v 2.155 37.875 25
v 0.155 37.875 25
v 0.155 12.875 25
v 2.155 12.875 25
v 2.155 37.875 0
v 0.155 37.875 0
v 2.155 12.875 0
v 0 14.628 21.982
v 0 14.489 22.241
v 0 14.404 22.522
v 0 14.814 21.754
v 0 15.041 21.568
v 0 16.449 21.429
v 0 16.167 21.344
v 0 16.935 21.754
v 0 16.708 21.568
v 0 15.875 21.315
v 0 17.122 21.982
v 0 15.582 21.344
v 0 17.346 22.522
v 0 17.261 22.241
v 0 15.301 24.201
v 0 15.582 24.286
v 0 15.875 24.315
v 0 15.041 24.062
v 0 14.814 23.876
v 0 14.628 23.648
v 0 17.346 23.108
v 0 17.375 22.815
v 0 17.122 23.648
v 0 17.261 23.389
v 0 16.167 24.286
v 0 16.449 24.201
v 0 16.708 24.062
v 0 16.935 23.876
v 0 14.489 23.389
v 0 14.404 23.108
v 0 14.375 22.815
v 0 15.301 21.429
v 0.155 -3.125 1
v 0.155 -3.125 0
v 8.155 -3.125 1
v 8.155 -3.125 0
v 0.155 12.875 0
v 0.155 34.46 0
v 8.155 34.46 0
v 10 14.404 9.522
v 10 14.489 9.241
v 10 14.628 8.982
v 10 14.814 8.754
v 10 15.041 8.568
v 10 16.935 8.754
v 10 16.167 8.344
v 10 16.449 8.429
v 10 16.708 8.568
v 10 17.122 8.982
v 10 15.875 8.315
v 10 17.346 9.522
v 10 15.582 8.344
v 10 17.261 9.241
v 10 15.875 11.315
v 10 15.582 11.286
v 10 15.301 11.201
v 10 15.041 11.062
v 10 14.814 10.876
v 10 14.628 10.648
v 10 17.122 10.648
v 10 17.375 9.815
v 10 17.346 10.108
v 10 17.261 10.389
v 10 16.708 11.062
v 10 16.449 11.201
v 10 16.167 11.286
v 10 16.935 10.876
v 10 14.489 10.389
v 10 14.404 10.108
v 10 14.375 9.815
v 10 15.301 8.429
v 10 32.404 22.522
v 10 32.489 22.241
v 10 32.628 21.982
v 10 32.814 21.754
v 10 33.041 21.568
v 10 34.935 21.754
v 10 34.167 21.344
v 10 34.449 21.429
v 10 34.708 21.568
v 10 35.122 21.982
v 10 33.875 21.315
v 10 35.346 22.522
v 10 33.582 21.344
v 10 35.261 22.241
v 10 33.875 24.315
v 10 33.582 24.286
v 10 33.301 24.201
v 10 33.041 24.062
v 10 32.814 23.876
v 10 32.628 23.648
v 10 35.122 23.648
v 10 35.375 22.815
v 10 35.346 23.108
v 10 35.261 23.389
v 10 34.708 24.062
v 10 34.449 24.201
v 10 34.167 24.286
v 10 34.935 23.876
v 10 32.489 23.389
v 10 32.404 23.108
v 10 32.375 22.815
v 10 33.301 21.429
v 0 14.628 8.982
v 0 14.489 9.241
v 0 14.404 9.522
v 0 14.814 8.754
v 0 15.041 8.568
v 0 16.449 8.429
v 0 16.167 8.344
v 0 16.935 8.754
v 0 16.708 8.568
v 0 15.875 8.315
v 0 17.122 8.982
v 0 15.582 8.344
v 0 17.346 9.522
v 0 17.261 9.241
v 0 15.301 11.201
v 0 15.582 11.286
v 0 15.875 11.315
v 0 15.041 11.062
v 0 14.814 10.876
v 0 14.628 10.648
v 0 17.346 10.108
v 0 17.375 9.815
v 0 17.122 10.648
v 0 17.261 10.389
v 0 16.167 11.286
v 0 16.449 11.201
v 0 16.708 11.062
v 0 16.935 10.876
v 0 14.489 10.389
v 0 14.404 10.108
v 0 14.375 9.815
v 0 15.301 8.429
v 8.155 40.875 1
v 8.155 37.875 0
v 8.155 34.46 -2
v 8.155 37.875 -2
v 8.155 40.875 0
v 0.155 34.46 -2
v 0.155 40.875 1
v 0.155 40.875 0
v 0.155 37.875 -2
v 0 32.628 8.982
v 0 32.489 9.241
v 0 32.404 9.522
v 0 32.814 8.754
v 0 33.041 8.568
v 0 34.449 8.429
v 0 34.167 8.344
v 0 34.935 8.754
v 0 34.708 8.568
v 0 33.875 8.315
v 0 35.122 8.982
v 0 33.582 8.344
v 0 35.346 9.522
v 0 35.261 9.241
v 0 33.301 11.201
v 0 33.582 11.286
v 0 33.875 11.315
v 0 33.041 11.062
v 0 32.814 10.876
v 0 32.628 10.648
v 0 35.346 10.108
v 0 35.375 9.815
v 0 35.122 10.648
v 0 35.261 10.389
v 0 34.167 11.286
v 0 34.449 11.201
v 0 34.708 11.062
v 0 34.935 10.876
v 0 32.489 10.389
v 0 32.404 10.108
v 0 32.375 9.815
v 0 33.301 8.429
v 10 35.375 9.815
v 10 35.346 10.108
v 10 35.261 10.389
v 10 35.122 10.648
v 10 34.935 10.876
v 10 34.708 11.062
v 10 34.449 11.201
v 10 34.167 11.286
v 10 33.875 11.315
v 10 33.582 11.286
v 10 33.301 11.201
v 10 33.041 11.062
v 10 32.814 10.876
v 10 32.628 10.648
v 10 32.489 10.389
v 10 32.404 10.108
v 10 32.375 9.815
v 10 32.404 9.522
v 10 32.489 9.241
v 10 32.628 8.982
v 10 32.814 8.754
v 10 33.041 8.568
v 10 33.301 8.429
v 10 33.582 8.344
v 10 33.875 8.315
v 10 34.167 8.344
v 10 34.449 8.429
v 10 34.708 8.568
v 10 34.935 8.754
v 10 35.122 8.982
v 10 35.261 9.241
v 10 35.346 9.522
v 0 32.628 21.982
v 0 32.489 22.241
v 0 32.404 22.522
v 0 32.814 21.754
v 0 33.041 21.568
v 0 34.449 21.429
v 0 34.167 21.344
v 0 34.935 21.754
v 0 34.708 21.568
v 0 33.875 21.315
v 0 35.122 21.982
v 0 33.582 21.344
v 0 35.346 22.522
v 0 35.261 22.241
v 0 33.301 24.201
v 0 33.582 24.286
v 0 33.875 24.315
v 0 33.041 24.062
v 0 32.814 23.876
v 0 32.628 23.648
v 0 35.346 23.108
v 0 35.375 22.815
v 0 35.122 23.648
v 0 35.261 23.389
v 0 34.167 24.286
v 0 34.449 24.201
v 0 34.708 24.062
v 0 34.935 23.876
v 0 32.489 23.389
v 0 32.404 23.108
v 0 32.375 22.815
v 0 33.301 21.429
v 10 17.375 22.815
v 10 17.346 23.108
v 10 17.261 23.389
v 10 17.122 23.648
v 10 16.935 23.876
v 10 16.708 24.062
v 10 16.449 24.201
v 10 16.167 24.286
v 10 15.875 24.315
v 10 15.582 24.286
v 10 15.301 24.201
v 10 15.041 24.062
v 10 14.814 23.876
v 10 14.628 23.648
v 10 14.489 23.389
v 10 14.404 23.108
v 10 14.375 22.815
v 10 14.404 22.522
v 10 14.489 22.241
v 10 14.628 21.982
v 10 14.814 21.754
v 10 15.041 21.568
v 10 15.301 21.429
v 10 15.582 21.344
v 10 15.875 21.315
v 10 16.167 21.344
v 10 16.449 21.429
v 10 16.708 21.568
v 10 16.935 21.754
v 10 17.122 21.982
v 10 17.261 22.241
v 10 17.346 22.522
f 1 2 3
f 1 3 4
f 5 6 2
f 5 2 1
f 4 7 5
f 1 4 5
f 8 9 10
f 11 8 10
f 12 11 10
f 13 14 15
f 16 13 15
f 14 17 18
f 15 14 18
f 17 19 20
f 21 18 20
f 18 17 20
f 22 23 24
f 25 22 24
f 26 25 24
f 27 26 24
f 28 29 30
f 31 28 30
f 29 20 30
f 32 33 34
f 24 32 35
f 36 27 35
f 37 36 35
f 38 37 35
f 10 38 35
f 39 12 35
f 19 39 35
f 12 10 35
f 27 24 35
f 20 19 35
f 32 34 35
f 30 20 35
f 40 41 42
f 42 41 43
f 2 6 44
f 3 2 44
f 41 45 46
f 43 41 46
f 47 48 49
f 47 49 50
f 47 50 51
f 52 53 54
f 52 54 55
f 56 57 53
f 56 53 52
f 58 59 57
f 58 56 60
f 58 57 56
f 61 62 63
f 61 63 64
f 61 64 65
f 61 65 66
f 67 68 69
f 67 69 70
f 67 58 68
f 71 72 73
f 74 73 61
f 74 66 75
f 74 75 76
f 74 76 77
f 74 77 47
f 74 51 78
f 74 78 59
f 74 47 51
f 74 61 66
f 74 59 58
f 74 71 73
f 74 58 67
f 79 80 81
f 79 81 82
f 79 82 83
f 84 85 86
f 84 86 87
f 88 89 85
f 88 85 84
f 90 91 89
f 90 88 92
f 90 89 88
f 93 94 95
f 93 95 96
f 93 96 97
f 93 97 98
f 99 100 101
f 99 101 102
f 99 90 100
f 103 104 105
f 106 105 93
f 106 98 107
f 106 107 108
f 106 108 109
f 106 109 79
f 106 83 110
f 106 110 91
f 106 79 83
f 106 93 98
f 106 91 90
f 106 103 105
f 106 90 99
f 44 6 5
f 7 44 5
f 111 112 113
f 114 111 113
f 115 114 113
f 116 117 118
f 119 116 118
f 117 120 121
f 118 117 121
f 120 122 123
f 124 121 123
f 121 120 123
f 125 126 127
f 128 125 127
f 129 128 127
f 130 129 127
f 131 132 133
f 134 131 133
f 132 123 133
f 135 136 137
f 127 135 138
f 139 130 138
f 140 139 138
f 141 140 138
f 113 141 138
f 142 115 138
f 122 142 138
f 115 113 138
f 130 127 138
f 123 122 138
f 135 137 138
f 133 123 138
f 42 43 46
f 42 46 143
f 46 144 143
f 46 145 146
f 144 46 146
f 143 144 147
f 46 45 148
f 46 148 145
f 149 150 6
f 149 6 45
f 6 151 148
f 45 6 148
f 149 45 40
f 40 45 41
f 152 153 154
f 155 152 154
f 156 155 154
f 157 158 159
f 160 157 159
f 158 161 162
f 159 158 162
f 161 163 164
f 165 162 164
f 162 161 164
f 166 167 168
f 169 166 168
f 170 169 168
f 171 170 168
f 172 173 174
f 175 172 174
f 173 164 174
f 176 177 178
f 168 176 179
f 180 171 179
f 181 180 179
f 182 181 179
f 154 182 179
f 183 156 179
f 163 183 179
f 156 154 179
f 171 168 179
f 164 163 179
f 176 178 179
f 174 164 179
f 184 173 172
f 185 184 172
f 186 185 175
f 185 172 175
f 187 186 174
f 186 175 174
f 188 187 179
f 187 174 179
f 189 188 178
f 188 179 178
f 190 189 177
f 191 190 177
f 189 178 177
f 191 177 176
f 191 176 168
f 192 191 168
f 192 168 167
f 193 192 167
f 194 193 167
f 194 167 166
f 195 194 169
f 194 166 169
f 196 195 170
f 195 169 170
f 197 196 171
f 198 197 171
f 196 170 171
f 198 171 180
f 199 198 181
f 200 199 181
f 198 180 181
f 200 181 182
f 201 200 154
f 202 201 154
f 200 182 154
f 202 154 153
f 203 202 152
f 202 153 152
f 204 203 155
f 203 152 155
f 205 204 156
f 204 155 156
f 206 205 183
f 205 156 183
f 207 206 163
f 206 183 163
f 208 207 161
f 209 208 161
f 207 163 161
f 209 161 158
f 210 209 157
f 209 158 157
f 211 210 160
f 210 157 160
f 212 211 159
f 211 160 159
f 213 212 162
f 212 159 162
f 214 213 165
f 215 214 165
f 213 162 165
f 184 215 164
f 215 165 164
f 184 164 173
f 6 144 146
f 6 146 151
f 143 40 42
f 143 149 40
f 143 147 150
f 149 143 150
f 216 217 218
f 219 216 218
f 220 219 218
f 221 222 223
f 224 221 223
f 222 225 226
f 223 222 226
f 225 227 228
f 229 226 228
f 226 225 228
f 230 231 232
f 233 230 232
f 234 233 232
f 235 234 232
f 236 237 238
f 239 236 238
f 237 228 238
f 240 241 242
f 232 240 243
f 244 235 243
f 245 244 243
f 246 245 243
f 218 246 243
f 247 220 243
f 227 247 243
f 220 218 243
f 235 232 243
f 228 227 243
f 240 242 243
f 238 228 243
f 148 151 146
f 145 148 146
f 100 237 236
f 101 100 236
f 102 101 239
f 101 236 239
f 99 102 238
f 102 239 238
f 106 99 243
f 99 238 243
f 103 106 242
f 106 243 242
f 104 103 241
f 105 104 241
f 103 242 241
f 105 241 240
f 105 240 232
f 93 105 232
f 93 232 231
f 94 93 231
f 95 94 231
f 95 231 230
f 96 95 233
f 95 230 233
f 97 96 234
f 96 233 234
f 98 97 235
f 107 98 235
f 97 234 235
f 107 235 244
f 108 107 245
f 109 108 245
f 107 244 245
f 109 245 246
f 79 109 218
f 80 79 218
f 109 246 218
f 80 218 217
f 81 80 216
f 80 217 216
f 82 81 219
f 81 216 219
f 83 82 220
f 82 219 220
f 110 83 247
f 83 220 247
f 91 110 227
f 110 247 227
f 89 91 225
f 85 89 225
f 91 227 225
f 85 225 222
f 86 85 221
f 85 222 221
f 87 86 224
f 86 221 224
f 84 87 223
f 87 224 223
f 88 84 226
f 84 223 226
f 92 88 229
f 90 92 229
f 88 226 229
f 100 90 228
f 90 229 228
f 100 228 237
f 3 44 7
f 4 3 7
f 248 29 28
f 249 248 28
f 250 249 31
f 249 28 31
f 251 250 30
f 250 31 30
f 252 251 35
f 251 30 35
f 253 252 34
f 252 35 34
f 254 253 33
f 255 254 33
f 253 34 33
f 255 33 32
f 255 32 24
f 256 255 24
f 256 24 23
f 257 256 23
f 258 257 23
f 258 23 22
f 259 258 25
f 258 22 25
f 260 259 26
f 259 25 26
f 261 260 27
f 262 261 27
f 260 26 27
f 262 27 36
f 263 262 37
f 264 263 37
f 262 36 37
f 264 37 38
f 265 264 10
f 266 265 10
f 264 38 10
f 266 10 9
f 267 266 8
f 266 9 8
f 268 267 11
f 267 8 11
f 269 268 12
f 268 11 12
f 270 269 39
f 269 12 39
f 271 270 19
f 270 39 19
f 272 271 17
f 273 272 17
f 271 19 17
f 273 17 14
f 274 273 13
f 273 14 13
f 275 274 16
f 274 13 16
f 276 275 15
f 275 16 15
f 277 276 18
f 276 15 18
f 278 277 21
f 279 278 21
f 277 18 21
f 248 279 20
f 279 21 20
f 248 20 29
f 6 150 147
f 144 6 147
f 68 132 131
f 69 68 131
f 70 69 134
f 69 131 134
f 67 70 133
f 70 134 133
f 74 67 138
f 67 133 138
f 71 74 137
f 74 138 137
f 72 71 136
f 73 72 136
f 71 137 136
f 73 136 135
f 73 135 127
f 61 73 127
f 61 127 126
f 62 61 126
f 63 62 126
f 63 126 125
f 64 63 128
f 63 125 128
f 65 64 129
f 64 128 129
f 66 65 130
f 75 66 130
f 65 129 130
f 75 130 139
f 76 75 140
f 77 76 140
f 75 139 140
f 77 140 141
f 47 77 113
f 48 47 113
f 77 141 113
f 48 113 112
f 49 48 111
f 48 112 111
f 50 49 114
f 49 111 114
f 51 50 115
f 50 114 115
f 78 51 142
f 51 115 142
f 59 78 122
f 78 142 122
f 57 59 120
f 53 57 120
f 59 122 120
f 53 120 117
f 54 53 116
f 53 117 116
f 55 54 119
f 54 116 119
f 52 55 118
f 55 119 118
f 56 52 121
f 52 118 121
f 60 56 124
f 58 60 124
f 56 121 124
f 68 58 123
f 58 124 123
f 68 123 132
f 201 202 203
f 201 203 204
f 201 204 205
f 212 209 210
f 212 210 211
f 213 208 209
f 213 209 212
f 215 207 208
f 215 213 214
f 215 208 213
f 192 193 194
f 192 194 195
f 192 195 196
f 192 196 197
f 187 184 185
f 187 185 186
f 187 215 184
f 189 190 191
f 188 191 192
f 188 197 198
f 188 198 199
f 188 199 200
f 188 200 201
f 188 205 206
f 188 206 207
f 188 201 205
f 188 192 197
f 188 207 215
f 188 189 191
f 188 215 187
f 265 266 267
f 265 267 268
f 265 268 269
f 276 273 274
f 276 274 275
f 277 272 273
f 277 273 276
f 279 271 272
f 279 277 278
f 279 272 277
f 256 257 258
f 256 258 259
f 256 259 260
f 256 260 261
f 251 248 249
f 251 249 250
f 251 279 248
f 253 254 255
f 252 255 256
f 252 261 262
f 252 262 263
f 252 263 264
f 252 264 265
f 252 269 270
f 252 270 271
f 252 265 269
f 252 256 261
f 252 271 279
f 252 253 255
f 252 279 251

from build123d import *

# Parameters (mm, degrees)
F0_W     = 6
F0_H     = 3.4142509103
F0_W_2   = 2
F1_DEPTH = 2
F0_H_2   = 21.5857490897
F2_DEPTH = 1
F3_DEPTH = 25
F4_R     = 1.5
F5_DEPTH = 10


with BuildPart() as f1:
    # F0 (on Top) → F1 (new body)
    with BuildSketch(Plane.XY):
        with Locations((5.1546765715, 36.1676104367)):
            Rectangle(F0_W, F0_H)
        with Locations((1.1546765715, 36.1676104367)):
            Rectangle(F0_W_2, F0_H)
    extrude(amount=-F1_DEPTH)

    # F0 (on Top) → F2 (join)
    with BuildSketch(Plane.XY):
        Polygon((2.1546765715, 12.8747358918), (0.1546765715, 12.8747358918), (0.1546765715, -3.1252641082), (8.1546765715, -3.1252641082), (8.1546765715, 34.4604849815), (2.1546765715, 34.4604849815), align=None)
        with Locations((1.1546765715, 36.1676104367)):
            Rectangle(F0_W_2, F0_H)
        with Locations((5.1546765715, 36.1676104367)):
            Rectangle(F0_W, F0_H)
        Polygon((4, 40.8747358918), (0.1546765715, 40.8747358918), (0.1546765715, 37.8747358918), (2.1546765715, 37.8747358918), (8.1546765715, 37.8747358918), (8.1546765715, 40.8747358918), align=None)
        with Locations((1.1546765715, 23.6676104367)):
            Rectangle(F0_W_2, F0_H_2)
    extrude(amount=F2_DEPTH)


with BuildPart() as f3:
    # F0 (on Top) → F3 (new body)
    with BuildSketch(Plane.XY):
        with Locations((1.1546765715, 36.1676104367)):
            Rectangle(F0_W_2, F0_H)
        with Locations((1.1546765715, 23.6676104367)):
            Rectangle(F0_W_2, F0_H_2)
    extrude(amount=F3_DEPTH)


with BuildPart() as f5:
    # F4 (on Right) → F5 (new body)
    with BuildSketch(Plane.YZ):
        with Locations((15.8747358918, 9.8151313141)):
            Circle(F4_R)
    extrude(amount=F5_DEPTH)


with BuildPart() as f5b:
    # F4 (on Right) → F5, piece 2 (new body)
    with BuildSketch(Plane.YZ):
        with Locations((15.8747358918, 22.8151313141)):
            Circle(F4_R)
    extrude(amount=F5_DEPTH)


with BuildPart() as f5c:
    # F4 (on Right) → F5, piece 3 (new body)
    with BuildSketch(Plane.YZ):
        with Locations((33.8747358918, 22.8151313141)):
            Circle(F4_R)
    extrude(amount=F5_DEPTH)


with BuildPart() as f5d:
    # F4 (on Right) → F5, piece 4 (new body)
    with BuildSketch(Plane.YZ):
        with Locations((33.8747358918, 9.8151313141)):
            Circle(F4_R)
    extrude(amount=F5_DEPTH)


solid = Compound([f1.part, f3.part, f5.part, f5b.part, f5c.part, f5d.part])
